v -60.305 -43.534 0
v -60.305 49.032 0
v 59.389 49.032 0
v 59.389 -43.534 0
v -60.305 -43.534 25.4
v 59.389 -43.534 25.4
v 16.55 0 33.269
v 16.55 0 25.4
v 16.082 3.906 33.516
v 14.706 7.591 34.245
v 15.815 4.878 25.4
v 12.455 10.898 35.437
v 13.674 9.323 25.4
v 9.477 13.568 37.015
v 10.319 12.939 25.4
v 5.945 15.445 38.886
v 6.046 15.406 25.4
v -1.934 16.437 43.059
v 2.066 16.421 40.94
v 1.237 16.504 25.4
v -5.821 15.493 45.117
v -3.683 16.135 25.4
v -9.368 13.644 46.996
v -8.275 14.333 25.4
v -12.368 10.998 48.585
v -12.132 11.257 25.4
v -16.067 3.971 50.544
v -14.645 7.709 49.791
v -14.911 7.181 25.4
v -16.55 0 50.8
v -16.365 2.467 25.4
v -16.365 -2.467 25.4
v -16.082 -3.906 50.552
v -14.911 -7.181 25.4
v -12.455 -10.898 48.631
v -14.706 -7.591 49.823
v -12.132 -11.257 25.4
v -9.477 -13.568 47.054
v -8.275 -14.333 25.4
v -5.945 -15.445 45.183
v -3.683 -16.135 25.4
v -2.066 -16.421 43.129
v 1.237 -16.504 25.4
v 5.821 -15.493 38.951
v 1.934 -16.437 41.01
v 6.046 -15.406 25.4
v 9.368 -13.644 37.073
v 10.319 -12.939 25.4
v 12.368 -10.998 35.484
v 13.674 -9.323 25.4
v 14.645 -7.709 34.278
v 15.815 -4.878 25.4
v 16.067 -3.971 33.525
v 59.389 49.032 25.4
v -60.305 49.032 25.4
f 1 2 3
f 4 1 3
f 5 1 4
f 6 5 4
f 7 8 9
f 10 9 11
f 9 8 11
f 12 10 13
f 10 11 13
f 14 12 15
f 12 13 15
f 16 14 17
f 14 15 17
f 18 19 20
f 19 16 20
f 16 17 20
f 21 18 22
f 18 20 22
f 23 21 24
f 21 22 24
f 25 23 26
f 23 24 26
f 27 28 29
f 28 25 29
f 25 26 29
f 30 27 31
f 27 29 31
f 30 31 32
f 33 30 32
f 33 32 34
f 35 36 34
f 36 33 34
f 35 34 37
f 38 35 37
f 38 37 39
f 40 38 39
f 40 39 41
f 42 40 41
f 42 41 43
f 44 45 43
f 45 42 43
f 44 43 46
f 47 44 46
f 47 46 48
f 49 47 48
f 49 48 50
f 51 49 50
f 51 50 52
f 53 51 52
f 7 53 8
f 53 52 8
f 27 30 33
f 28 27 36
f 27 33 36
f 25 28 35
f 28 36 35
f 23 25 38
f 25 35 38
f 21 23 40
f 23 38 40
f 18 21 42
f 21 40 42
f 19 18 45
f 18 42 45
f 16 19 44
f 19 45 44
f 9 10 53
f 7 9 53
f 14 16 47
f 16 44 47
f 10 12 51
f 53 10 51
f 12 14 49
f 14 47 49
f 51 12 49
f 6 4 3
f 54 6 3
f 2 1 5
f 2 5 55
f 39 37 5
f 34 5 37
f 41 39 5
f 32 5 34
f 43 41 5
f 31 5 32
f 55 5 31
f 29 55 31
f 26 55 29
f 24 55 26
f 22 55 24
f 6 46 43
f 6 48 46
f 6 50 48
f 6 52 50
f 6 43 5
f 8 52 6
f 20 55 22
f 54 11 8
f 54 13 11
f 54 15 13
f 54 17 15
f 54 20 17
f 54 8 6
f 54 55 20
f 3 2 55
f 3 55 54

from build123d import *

# Parameters (mm, degrees)
F0_W     = 119.694226
F0_H     = 92.565984
F1_DEPTH = 25.4
F2_R     = 16.550029
F3_DEPTH = 25.4
F5_DEPTH = 92.566984


with BuildPart() as f1:
    # F0 (on Top) → F1 (new body)
    with BuildSketch(Plane.XY):
        with Locations((-0.458248, 2.749484)):
            Rectangle(F0_W, F0_H)
    extrude(amount=F1_DEPTH)

    # F2 (on face) → F3 (join)
    with BuildSketch(Plane.XY.offset(25.4)):
        Circle(F2_R)
    extrude(amount=F3_DEPTH)

    # F4 (on face) → F5 (cut, through all)
    with BuildSketch(Plane.XZ.offset(43.533508)):
        Polygon((16.550029, 50.8), (-16.550029, 50.8), (16.550029, 33.268765), align=None)
    extrude(amount=-F5_DEPTH, mode=Mode.SUBTRACT)


solid = f1.part
